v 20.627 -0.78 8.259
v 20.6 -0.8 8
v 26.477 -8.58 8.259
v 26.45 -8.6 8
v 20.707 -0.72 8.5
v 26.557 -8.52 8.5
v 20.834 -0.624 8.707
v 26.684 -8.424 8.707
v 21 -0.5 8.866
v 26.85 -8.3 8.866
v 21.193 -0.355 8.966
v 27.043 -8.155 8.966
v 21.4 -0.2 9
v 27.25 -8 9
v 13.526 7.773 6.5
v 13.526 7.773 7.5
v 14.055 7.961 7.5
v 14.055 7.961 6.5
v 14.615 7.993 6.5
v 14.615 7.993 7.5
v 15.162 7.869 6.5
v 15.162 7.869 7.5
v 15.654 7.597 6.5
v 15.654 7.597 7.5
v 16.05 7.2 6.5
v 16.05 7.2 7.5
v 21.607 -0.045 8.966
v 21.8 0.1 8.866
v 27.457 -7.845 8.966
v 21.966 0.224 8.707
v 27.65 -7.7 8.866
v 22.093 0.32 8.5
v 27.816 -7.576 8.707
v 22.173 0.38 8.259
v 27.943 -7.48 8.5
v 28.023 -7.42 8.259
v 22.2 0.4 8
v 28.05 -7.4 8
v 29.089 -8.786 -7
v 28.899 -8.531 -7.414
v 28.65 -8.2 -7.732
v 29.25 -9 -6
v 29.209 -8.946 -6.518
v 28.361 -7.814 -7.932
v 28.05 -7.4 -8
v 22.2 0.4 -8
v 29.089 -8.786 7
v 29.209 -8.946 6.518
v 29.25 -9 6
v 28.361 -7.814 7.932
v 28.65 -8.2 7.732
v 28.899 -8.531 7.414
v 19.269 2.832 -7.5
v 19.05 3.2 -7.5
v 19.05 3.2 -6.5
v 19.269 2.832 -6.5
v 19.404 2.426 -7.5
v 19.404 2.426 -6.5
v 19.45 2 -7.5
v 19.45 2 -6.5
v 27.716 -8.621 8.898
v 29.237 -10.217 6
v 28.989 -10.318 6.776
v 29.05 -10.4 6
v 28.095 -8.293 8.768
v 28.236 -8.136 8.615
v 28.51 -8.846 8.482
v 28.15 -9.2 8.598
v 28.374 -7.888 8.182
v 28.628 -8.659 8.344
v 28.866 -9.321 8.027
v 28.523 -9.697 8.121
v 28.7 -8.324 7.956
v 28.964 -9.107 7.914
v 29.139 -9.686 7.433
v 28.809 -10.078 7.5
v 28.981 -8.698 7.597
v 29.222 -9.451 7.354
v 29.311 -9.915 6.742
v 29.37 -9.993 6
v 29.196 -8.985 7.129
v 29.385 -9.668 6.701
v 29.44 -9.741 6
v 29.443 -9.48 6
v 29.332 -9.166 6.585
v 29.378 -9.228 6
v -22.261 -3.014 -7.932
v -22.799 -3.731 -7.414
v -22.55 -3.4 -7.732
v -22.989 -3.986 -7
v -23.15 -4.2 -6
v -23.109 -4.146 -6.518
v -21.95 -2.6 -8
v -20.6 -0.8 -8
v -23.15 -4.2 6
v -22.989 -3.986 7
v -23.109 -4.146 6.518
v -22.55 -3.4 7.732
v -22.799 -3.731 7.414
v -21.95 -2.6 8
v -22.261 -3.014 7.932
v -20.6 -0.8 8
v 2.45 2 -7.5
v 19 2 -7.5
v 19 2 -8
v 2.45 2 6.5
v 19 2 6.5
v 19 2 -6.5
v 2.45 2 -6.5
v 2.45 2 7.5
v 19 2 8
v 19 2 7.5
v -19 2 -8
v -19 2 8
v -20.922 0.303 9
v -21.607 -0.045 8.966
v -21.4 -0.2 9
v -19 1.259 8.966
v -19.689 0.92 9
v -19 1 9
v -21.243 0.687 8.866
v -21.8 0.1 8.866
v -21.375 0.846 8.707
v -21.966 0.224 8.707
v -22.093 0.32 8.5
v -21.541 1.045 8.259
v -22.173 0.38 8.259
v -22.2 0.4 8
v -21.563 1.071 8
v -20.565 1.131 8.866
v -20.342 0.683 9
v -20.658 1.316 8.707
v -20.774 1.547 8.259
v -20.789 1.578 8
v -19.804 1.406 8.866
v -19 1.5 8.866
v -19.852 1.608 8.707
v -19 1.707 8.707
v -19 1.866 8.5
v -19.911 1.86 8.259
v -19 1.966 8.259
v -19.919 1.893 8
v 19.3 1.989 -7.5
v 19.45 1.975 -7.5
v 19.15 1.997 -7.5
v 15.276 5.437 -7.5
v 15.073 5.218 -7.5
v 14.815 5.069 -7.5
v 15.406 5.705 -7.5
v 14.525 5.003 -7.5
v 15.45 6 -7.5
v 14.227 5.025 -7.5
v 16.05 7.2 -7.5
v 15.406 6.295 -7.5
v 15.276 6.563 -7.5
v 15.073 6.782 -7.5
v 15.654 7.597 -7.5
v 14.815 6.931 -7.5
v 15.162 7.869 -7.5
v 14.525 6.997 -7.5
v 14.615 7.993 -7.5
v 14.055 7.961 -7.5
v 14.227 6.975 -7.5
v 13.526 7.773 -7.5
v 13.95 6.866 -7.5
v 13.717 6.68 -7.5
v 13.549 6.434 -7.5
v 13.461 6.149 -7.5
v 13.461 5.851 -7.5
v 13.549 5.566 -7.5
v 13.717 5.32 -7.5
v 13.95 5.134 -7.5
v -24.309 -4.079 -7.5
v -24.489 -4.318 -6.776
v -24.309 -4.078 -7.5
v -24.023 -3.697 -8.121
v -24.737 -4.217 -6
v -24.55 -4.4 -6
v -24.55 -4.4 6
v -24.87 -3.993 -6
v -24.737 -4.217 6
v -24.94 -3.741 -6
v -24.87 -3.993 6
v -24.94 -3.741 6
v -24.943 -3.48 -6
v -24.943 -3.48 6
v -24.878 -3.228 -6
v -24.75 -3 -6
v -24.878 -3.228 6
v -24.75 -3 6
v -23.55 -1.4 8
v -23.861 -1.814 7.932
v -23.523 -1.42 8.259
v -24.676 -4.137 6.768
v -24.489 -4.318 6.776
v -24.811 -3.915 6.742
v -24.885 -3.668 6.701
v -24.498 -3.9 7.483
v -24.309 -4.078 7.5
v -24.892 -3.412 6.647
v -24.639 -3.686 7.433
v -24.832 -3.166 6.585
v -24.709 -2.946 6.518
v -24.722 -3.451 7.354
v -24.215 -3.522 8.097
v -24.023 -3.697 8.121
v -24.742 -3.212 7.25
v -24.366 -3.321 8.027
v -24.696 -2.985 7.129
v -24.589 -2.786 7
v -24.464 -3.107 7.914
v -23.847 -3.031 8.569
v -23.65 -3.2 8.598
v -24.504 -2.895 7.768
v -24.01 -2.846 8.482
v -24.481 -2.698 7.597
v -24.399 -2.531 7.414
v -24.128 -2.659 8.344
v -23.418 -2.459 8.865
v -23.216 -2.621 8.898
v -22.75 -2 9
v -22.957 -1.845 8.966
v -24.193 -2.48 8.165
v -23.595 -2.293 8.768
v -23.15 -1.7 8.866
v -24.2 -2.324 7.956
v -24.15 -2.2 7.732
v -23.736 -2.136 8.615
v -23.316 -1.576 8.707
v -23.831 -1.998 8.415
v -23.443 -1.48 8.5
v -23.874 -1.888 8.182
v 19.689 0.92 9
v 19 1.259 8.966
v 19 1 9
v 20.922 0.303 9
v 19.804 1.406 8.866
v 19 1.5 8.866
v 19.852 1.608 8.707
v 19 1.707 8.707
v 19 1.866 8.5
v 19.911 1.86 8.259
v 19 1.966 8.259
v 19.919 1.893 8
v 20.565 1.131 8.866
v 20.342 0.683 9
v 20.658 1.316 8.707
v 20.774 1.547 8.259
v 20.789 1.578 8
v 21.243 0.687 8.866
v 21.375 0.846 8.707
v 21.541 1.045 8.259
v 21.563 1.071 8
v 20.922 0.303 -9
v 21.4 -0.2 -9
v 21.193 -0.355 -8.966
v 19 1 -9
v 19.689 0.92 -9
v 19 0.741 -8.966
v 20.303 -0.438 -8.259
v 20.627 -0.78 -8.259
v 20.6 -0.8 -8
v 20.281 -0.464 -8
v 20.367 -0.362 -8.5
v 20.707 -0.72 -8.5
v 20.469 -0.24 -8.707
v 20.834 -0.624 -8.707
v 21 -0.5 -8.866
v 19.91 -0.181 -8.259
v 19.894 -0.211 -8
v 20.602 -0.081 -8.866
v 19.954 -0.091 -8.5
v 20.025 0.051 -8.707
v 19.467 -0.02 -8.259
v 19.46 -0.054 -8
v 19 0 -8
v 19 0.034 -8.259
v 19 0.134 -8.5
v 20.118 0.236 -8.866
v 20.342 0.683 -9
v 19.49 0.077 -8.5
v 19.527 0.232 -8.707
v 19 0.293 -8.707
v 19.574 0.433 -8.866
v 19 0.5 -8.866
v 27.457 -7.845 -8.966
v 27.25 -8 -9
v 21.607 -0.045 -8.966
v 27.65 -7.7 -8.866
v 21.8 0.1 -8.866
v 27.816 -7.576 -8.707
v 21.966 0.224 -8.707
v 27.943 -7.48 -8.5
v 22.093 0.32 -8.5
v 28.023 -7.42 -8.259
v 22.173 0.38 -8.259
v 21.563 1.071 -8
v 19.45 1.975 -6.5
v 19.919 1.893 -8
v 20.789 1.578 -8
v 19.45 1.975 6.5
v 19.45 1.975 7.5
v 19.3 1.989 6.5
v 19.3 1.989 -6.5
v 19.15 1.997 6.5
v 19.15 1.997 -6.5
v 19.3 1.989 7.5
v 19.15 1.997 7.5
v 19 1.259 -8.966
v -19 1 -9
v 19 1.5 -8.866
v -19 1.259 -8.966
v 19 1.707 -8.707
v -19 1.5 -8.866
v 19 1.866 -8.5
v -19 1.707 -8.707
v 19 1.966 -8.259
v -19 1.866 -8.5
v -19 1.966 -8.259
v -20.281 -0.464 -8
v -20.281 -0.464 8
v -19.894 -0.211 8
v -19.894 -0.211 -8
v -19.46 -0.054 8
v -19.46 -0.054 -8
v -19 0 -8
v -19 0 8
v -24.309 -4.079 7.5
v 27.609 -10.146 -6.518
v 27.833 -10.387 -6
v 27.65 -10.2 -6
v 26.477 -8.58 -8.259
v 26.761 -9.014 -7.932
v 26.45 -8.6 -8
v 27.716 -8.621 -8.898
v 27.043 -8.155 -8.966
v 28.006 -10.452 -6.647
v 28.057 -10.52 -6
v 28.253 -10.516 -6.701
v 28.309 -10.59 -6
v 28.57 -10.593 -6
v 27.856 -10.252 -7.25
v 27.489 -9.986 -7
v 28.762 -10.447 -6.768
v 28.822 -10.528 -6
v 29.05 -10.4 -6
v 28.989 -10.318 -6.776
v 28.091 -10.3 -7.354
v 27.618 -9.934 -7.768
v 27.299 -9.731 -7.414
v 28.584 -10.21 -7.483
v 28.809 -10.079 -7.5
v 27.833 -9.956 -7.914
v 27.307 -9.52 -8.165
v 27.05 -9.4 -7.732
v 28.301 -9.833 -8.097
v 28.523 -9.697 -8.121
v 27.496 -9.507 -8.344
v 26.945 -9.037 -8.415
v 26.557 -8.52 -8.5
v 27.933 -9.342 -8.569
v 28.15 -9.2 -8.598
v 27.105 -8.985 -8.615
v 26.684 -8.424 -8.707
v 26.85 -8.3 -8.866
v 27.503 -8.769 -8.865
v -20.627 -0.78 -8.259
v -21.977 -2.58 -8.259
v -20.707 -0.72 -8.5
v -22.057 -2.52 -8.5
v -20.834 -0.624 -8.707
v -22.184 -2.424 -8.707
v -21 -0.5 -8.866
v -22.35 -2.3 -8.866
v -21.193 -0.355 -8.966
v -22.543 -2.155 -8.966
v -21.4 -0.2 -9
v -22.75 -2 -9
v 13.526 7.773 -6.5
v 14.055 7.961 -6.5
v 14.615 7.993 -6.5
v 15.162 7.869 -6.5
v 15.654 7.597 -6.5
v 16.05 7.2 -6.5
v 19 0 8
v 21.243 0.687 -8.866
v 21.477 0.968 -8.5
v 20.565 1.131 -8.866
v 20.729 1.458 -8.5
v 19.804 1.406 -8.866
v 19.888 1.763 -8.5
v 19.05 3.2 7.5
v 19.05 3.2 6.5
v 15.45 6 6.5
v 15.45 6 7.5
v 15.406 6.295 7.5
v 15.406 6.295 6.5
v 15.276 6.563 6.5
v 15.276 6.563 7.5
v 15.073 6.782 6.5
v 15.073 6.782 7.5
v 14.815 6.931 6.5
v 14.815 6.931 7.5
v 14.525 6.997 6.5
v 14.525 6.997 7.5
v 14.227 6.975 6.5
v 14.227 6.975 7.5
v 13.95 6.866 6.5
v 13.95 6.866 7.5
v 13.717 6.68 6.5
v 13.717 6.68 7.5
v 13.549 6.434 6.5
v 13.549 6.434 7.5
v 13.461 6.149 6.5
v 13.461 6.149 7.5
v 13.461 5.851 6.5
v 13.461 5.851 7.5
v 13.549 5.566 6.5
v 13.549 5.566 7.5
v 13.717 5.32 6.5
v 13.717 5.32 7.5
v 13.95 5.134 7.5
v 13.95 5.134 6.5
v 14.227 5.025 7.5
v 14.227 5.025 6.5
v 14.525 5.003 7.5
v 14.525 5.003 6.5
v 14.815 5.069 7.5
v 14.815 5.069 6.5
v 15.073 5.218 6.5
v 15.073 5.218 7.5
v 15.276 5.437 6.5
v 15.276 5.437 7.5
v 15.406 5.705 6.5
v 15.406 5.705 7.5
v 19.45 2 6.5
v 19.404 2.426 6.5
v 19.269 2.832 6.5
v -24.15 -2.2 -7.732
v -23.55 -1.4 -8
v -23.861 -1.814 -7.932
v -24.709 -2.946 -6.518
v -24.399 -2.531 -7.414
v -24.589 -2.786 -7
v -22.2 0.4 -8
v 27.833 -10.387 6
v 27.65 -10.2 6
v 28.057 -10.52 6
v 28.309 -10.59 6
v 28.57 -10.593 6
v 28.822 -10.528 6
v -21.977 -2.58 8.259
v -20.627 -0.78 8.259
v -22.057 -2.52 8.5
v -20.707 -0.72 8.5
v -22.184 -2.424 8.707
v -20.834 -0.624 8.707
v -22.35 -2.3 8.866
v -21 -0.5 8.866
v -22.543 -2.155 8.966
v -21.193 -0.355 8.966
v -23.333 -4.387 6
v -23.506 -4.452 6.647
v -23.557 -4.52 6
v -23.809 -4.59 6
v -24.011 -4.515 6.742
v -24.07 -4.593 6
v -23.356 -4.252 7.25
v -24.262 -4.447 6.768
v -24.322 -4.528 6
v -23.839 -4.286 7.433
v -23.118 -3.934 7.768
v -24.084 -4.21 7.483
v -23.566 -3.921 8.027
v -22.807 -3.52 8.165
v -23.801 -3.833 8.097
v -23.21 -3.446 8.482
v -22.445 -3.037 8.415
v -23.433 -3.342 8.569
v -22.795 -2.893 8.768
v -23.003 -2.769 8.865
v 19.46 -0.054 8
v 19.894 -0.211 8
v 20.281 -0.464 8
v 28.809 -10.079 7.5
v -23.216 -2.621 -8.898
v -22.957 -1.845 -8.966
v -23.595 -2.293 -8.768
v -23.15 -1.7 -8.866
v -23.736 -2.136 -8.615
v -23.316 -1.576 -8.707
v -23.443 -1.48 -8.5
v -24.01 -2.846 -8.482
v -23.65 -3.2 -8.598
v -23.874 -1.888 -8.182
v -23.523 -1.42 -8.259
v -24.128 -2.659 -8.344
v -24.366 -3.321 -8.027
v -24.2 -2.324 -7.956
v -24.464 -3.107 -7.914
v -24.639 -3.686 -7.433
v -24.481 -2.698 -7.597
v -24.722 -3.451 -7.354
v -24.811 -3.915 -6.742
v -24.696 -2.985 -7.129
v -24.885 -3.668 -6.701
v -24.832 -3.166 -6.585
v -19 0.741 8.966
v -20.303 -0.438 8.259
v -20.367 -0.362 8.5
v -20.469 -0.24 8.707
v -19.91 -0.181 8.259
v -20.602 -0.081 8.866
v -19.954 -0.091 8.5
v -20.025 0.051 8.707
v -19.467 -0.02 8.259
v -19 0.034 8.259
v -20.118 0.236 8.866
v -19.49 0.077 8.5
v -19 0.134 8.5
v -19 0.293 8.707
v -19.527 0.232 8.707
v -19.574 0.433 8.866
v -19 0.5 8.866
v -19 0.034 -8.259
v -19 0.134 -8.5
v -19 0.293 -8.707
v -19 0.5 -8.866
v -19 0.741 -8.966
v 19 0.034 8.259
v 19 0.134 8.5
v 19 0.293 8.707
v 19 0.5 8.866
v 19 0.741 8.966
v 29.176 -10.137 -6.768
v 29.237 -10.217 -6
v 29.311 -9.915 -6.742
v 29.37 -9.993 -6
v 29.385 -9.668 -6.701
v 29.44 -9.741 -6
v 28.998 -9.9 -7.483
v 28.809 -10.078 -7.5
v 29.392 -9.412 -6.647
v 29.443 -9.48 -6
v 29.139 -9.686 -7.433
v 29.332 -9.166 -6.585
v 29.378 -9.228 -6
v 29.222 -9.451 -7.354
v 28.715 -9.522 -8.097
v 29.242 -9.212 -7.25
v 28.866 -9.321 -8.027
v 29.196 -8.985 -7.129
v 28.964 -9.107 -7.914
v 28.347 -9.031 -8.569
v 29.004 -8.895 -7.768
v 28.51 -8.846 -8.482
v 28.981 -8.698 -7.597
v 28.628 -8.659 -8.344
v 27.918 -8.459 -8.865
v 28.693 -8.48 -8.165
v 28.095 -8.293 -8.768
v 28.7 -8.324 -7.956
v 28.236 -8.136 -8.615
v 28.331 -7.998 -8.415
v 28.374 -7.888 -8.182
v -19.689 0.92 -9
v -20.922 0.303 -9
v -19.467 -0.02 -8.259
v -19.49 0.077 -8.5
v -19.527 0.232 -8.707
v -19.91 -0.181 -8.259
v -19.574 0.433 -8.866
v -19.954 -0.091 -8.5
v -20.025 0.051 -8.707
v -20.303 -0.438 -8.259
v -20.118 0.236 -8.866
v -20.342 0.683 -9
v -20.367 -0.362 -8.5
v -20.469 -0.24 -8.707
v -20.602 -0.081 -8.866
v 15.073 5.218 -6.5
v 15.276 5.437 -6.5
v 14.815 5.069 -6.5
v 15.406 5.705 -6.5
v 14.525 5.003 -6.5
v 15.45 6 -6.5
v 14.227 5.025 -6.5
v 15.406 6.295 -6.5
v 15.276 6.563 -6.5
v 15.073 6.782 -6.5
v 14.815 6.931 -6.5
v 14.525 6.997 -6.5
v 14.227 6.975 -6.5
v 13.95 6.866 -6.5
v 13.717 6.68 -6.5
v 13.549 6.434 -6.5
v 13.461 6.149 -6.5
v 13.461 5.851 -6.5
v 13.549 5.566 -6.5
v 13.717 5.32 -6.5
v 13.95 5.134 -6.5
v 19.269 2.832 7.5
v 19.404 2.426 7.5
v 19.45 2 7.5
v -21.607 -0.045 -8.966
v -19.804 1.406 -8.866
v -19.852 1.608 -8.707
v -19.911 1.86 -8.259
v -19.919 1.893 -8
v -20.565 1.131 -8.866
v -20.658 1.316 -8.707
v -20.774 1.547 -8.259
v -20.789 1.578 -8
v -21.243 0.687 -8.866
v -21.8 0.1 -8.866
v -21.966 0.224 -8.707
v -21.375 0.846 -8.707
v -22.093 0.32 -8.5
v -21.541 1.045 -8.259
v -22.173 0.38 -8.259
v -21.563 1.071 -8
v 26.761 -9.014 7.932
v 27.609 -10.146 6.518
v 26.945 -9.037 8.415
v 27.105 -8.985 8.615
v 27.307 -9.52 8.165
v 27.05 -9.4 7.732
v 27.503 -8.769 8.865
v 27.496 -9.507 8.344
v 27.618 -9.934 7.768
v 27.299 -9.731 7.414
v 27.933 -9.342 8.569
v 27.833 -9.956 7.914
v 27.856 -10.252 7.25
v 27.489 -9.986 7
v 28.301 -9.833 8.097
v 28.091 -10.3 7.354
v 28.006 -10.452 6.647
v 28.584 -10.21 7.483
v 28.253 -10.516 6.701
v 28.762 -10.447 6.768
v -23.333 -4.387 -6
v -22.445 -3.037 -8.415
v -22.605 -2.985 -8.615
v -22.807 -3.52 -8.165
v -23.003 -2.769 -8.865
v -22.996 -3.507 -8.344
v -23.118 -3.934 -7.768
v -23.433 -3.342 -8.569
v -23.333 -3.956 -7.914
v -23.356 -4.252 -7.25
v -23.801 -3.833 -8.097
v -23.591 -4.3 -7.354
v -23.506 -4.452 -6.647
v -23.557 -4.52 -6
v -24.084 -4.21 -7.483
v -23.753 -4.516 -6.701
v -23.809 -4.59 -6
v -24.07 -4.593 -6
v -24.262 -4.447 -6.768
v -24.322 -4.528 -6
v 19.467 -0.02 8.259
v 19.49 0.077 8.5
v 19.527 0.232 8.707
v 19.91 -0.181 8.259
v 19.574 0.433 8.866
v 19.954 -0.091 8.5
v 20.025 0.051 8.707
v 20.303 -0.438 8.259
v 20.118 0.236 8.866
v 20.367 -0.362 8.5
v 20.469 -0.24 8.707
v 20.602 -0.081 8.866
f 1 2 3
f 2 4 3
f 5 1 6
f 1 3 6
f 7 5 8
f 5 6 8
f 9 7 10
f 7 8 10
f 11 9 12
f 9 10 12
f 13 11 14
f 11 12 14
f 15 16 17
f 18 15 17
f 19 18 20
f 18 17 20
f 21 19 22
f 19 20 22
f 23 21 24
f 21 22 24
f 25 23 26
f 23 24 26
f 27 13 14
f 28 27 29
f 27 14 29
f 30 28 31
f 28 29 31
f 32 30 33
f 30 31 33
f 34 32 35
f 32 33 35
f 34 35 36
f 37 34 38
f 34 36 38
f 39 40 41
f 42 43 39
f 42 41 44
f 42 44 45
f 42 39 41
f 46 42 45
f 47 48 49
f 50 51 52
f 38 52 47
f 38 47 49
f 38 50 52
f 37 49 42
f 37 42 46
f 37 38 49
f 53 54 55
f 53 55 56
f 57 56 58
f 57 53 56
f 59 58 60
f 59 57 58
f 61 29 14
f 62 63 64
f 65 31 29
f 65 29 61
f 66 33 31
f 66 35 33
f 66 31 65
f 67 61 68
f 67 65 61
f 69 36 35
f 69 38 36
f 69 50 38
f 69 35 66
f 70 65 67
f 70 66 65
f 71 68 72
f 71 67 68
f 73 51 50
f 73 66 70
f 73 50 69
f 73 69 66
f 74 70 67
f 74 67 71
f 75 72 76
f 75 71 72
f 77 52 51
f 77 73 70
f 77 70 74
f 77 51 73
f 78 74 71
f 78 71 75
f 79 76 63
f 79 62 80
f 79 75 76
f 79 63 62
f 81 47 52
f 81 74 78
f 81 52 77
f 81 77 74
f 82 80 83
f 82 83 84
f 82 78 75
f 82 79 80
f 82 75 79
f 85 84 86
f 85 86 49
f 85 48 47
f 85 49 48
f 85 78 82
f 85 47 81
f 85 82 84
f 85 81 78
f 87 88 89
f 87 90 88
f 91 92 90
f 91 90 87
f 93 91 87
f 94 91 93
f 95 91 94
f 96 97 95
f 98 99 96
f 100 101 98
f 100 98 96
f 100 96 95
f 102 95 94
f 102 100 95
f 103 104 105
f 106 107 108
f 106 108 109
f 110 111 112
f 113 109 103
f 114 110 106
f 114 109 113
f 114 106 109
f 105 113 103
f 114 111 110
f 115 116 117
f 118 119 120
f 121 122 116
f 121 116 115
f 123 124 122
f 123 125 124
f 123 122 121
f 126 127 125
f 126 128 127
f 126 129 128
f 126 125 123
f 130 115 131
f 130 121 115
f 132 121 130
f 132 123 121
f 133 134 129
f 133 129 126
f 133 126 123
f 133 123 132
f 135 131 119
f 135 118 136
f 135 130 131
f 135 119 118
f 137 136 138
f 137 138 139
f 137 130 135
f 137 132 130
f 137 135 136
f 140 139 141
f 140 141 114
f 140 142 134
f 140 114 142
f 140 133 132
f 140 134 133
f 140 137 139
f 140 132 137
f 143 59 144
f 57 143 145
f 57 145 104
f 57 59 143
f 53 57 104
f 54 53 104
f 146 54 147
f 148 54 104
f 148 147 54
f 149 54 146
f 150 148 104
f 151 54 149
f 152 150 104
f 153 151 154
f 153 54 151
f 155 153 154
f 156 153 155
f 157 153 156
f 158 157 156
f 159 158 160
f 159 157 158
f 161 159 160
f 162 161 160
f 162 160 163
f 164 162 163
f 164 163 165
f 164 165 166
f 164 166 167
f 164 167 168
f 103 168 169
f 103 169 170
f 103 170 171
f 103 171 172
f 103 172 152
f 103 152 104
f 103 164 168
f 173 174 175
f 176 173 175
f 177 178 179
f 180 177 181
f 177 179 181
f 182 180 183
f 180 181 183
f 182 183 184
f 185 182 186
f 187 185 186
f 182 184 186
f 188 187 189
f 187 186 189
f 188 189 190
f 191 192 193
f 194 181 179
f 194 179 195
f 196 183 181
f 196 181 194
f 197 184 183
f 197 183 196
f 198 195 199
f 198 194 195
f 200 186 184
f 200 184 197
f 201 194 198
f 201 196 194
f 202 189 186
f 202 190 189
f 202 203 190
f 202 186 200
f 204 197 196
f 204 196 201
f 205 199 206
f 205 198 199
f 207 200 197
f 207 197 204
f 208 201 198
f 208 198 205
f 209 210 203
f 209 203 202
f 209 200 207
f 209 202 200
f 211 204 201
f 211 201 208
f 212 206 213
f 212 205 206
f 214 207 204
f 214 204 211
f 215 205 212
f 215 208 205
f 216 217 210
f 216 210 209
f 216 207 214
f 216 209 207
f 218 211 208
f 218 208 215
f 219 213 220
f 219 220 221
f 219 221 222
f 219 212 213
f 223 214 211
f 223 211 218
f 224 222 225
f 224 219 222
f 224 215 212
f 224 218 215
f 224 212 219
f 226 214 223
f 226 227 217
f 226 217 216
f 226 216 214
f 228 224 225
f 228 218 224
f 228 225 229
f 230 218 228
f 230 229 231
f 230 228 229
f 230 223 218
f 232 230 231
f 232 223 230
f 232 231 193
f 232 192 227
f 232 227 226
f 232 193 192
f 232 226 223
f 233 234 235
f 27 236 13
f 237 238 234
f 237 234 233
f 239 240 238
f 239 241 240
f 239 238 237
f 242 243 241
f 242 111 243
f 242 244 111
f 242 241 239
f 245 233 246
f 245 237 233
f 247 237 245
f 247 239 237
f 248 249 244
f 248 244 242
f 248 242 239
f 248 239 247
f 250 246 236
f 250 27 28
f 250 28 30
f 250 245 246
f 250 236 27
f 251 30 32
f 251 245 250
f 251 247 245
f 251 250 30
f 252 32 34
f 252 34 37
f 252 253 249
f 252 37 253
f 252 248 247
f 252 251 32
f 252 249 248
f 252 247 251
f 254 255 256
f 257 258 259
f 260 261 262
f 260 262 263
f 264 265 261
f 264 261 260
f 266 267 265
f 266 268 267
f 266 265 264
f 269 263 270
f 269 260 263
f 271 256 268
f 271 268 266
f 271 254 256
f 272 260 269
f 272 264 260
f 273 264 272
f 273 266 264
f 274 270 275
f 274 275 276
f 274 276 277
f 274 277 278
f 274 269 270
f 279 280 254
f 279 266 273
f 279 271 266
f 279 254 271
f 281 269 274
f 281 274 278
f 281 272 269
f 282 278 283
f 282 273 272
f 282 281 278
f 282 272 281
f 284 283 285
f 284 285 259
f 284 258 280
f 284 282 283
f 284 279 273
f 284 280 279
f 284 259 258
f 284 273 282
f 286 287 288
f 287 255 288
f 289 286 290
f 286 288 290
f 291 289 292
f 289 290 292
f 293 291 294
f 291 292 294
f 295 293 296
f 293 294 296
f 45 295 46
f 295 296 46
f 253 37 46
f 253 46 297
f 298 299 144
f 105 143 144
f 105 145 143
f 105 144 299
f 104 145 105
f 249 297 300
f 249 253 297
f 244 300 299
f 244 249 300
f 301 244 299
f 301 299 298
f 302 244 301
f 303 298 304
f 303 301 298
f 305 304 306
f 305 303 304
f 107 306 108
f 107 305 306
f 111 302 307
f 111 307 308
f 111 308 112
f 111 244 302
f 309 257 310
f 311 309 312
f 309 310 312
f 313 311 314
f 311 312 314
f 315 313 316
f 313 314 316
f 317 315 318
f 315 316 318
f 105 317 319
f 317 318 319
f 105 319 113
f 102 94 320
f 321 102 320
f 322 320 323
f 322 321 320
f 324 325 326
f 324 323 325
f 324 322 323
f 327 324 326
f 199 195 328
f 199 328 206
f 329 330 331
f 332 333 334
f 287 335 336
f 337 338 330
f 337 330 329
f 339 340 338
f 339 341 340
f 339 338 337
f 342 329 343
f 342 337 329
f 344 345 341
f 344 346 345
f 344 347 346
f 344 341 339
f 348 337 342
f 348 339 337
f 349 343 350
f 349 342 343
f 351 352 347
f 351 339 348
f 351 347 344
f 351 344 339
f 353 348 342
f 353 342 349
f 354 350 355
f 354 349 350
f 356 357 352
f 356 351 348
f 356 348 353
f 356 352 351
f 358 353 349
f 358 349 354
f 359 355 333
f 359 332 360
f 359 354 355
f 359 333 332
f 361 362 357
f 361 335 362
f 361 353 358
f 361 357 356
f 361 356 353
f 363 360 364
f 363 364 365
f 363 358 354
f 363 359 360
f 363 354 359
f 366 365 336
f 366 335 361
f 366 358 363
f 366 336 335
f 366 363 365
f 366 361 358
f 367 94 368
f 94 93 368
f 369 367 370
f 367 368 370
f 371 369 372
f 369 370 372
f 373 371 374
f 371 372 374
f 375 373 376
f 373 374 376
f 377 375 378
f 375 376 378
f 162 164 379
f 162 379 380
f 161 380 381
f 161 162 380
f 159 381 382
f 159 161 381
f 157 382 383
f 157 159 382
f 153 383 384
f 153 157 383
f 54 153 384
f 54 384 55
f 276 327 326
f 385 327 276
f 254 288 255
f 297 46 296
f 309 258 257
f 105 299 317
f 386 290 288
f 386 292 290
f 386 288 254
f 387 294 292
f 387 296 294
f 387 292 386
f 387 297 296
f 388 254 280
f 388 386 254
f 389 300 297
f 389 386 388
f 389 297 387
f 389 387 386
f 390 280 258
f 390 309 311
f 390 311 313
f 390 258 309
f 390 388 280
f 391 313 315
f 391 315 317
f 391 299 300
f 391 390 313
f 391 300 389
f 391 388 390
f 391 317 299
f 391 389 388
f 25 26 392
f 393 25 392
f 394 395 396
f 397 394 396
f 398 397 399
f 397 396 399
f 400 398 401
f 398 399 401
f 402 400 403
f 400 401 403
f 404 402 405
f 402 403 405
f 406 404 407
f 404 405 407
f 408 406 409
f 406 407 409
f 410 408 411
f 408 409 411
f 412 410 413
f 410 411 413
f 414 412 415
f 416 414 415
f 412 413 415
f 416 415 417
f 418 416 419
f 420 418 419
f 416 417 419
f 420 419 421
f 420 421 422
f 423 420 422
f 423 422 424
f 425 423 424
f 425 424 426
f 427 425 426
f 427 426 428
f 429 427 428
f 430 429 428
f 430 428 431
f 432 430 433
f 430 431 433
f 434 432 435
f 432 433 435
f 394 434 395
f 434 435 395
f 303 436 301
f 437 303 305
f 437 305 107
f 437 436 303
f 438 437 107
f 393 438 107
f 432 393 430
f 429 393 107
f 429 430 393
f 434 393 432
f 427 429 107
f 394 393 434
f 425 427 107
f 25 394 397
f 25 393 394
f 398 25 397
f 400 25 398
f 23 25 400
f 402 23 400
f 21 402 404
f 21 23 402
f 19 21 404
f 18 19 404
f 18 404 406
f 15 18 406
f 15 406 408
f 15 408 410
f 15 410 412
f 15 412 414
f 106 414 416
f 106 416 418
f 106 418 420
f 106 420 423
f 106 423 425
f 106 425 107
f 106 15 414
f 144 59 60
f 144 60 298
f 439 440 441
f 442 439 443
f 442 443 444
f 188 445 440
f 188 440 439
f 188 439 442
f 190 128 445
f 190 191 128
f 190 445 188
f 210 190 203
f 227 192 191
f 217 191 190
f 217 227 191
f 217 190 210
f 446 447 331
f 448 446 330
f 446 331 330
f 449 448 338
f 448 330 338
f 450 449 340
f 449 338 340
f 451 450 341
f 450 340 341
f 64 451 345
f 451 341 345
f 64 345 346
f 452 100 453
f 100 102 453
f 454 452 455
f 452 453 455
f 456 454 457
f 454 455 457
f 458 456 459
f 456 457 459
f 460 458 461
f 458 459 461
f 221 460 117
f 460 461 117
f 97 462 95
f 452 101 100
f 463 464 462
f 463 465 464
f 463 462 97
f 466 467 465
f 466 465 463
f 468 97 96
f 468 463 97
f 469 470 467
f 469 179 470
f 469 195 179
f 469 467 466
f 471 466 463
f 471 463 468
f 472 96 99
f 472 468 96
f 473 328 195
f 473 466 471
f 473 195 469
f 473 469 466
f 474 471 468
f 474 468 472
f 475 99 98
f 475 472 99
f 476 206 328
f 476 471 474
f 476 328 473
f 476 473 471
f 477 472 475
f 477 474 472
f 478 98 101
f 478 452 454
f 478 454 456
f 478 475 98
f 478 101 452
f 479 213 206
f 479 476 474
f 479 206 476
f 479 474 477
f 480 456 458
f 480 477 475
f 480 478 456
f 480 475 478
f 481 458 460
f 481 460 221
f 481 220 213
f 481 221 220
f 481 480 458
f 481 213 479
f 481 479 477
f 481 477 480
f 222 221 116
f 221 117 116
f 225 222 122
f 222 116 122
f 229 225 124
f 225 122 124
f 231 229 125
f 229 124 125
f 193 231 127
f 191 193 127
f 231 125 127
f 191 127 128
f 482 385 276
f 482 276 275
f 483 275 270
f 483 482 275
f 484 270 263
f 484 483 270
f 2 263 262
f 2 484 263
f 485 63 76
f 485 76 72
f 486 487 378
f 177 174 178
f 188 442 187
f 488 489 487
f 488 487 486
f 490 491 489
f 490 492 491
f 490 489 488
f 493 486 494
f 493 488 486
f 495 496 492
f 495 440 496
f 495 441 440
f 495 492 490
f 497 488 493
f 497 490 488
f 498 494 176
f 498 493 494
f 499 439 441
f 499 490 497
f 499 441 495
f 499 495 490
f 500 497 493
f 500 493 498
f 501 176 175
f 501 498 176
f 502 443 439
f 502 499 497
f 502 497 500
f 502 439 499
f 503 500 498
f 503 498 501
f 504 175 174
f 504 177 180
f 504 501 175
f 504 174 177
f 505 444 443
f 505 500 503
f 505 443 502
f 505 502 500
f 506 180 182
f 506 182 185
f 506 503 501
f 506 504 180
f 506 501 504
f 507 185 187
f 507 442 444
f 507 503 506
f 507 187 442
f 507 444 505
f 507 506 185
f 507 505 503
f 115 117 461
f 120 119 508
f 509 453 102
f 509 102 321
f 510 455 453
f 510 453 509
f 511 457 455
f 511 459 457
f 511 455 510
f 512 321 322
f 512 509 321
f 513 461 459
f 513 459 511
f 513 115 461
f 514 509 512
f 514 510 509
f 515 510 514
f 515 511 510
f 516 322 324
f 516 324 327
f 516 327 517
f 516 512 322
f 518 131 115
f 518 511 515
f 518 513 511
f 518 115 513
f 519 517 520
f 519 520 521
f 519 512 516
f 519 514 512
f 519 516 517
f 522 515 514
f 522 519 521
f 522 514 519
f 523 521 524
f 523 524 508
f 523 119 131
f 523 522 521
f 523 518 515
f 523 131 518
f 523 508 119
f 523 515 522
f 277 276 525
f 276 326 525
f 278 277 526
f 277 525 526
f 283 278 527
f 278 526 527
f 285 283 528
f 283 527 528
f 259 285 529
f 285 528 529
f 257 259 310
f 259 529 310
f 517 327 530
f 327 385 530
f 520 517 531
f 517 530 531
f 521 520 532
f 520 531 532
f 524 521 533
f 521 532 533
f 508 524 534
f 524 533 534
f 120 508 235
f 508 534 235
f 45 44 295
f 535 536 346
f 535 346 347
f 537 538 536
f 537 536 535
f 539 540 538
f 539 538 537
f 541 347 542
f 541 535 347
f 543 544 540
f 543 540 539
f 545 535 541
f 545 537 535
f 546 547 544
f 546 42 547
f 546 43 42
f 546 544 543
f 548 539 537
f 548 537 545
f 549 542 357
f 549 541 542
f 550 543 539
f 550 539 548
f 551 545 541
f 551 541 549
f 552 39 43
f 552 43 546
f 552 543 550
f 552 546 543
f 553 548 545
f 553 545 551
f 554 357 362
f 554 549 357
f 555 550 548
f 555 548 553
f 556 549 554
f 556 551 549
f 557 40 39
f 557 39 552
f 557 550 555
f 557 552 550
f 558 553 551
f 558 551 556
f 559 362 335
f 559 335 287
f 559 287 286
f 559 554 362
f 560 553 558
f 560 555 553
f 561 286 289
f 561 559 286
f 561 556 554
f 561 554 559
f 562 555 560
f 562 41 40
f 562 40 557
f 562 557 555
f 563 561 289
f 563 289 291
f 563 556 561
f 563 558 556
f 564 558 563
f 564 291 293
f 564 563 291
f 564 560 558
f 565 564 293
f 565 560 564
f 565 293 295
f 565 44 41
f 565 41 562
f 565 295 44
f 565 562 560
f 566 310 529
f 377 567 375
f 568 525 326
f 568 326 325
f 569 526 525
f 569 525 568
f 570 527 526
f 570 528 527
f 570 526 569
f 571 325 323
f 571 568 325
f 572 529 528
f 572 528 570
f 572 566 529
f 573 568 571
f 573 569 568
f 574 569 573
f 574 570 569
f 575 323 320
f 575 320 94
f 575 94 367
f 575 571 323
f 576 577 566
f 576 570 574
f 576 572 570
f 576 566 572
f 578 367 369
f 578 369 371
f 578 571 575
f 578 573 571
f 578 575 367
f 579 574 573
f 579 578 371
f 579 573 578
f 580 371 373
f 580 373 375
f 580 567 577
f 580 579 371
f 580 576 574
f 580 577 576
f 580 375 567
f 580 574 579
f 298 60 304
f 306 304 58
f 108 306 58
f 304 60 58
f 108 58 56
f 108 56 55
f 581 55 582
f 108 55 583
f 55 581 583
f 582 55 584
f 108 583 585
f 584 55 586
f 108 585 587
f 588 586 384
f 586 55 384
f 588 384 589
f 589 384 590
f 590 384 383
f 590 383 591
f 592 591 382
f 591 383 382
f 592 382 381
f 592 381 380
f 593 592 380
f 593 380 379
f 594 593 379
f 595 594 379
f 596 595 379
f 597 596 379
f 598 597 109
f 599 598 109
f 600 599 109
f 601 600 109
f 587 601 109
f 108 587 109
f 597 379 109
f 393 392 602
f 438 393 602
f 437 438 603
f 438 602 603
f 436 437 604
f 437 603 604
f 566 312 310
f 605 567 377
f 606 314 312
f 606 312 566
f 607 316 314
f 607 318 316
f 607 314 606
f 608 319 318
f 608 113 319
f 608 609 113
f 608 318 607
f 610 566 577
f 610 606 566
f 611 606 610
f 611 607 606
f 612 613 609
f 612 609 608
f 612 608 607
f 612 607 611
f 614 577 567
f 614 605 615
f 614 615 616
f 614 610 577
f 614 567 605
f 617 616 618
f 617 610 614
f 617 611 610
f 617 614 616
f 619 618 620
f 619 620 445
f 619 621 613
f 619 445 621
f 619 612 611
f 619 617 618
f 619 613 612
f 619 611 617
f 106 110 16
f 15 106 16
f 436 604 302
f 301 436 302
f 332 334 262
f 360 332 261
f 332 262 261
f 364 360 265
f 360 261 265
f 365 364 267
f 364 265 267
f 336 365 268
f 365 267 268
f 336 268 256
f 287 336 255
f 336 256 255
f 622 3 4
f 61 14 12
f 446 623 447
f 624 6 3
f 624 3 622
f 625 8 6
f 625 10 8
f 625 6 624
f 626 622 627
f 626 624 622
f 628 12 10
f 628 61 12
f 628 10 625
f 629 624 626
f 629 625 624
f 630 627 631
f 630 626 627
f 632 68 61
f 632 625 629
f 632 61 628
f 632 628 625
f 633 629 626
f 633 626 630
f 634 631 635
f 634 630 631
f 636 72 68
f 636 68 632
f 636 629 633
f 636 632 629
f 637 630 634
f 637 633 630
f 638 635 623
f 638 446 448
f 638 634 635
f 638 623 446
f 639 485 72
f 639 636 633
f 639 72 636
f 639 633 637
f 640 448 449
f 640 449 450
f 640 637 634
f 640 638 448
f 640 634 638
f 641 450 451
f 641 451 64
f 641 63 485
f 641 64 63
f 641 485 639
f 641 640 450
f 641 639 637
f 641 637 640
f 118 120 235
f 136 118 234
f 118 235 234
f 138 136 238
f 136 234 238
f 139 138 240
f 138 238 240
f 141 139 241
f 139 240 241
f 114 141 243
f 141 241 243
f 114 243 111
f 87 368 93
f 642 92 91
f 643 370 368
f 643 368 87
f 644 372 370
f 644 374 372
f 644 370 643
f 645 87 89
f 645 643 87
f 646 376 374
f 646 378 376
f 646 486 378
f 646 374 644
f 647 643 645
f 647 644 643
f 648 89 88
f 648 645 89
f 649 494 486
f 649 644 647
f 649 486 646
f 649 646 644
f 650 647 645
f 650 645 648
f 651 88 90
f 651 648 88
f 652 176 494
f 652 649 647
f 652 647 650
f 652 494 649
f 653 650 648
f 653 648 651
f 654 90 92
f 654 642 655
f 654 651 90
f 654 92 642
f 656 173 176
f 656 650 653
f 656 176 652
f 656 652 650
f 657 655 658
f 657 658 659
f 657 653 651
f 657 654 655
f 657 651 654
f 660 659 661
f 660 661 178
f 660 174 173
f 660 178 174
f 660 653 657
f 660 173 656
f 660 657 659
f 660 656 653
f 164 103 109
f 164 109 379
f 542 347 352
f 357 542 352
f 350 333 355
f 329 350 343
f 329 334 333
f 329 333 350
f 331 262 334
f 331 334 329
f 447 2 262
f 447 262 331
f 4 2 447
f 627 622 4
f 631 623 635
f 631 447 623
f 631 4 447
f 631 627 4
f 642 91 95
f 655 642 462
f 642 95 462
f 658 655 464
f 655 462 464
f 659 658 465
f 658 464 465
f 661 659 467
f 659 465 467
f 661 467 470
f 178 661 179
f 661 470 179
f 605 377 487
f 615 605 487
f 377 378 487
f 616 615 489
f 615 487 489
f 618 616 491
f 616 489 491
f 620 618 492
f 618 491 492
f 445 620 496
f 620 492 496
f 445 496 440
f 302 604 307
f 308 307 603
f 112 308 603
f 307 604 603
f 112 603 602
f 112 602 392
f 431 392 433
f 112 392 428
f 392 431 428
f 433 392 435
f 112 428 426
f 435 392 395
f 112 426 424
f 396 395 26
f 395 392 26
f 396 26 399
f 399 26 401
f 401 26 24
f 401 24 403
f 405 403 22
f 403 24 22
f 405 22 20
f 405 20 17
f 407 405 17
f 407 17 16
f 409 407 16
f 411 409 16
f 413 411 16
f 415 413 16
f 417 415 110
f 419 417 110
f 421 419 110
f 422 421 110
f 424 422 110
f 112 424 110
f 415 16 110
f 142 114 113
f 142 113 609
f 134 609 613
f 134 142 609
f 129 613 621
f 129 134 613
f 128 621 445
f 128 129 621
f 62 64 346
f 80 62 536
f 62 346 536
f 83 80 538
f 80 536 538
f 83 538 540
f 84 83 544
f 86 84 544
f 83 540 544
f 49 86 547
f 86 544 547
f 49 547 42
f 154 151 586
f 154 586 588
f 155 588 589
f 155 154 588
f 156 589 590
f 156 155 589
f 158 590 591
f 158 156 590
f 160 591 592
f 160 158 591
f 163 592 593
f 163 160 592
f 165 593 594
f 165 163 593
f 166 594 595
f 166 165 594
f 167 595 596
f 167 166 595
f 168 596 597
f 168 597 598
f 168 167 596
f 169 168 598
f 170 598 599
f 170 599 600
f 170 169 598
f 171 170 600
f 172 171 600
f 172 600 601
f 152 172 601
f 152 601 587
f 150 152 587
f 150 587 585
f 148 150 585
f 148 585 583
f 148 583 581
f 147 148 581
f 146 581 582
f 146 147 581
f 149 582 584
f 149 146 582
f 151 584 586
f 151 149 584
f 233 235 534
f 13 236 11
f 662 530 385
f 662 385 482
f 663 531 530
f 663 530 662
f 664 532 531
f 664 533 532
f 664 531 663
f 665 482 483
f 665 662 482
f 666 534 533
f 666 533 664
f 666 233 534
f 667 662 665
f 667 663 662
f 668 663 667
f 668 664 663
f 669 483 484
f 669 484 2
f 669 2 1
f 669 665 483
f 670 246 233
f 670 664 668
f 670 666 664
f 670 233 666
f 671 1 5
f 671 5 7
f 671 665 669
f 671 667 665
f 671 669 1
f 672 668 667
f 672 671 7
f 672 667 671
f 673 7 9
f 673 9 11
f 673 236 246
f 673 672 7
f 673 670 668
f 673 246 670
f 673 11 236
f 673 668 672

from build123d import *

# Parameters (mm, degrees)
EXTRUDE_THIN1_DEPTH = 9
FILLET1_R           = 3
FILLET2_R           = 1
SKETCH2_R           = 1
EXTRUDE1_DEPTH      = 1


with BuildPart() as part:
    # Sketch1 → Extrude-Thin1 (new, symmetric)
    with BuildSketch(Plane.XY):
        with BuildLine():
            Line((-23.75, -5), (-20.6, -0.8))
            ThreePointArc((-20.6, -0.8), (-19.894427191, -0.211145618), (-19, 0))
            Line((-19, 0), (19, 0))
            ThreePointArc((19, 0), (19.894427191, -0.211145618), (20.6, -0.8))
            Line((20.6, -0.8), (28.25, -11))
            Line((28.25, -11), (29.85, -9.8))
            Line((29.85, -9.8), (22.2, 0.4))
            ThreePointArc((22.2, 0.4), (20.788854382, 1.577708764), (19, 2))
            Line((19, 2), (-19, 2))
            ThreePointArc((-19, 2), (-20.788854382, 1.577708764), (-22.2, 0.4))
            Line((-22.2, 0.4), (-25.35, -3.8))
            Line((-25.35, -3.8), (-23.75, -5))
        make_face()
    extrude(amount=EXTRUDE_THIN1_DEPTH, both=True)

    # Fillet1
    fillet1_edges = [part.edges().sort_by_distance(p)[0] for p in [
        (29.05, -10.4, -9),
        (-24.55, -4.4, -9),
        (29.05, -10.4, 9),
        (-24.55, -4.4, 9),
    ]]
    fillet(fillet1_edges, radius=FILLET1_R)

    # Fillet2
    fillet2_edges = [part.edges().sort_by_distance(p)[0] for p in [
        (-21.275, -1.7, 9),
        (20.788854382, 1.577708764, -9),
        (0, 0, -9),
        (-20.788854382, 1.577708764, -9),
        (-21.275, -1.7, -9),
        (-22.875, -0.5, -9),
        (-20.788854382, 1.577708764, 9),
        (0, 0, 9),
        (20.788854382, 1.577708764, 9),
        (-23.75, -5, 0),
        (-25.35, -3.8, 0),
        (-24.822792206, -3.097056275, -8.121320344),
        (-24.822792206, -3.097056275, 8.121320344),
        (0, 2, 9),
        (23.525, -4.7, 9),
        (25.125, -3.5, 9),
        (25.125, -3.5, -9),
        (23.525, -4.7, -9),
        (28.25, -11, 0),
        (27.722792206, -10.297056275, 8.121320344),
        (-22.875, -0.5, 9),
        (27.722792206, -10.297056275, -8.121320344),
        (29.85, -9.8, 0),
        (0, 2, -9),
    ]]
    fillet(fillet2_edges, radius=FILLET2_R - 0.0001)  # a hair under: the kernel refuses the full size

    # Sketch2 → Extrude1 (add)
    with BuildSketch(Plane.XY.offset(7.5)):
        with BuildLine():
            Line((2.45, 2), (13.5255002, 7.7734994))
            ThreePointArc((13.5255002, 7.7734994), (14.893058146, 7.950307535), (16.05, 7.2))
            Line((16.05, 7.2), (19.05, 3.2))
            ThreePointArc((19.05, 3.2), (19.347366596, 2.632455532), (19.45, 2))
            Line((19.45, 2), (19.45, 1.974606899))
            ThreePointArc((19.45, 1.974606899), (19.225357943, 1.993646679), (19, 2))
            Line((19, 2), (2.45, 2))
        make_face()
        with Locations((14.45, 6)):
            Circle(SKETCH2_R, mode=Mode.SUBTRACT)
    extrude1 = extrude(amount=-EXTRUDE1_DEPTH)

    # Mirror1: Extrude1 across plane
    add(extrude1.mirror(Plane.XY))


solid = part.part
